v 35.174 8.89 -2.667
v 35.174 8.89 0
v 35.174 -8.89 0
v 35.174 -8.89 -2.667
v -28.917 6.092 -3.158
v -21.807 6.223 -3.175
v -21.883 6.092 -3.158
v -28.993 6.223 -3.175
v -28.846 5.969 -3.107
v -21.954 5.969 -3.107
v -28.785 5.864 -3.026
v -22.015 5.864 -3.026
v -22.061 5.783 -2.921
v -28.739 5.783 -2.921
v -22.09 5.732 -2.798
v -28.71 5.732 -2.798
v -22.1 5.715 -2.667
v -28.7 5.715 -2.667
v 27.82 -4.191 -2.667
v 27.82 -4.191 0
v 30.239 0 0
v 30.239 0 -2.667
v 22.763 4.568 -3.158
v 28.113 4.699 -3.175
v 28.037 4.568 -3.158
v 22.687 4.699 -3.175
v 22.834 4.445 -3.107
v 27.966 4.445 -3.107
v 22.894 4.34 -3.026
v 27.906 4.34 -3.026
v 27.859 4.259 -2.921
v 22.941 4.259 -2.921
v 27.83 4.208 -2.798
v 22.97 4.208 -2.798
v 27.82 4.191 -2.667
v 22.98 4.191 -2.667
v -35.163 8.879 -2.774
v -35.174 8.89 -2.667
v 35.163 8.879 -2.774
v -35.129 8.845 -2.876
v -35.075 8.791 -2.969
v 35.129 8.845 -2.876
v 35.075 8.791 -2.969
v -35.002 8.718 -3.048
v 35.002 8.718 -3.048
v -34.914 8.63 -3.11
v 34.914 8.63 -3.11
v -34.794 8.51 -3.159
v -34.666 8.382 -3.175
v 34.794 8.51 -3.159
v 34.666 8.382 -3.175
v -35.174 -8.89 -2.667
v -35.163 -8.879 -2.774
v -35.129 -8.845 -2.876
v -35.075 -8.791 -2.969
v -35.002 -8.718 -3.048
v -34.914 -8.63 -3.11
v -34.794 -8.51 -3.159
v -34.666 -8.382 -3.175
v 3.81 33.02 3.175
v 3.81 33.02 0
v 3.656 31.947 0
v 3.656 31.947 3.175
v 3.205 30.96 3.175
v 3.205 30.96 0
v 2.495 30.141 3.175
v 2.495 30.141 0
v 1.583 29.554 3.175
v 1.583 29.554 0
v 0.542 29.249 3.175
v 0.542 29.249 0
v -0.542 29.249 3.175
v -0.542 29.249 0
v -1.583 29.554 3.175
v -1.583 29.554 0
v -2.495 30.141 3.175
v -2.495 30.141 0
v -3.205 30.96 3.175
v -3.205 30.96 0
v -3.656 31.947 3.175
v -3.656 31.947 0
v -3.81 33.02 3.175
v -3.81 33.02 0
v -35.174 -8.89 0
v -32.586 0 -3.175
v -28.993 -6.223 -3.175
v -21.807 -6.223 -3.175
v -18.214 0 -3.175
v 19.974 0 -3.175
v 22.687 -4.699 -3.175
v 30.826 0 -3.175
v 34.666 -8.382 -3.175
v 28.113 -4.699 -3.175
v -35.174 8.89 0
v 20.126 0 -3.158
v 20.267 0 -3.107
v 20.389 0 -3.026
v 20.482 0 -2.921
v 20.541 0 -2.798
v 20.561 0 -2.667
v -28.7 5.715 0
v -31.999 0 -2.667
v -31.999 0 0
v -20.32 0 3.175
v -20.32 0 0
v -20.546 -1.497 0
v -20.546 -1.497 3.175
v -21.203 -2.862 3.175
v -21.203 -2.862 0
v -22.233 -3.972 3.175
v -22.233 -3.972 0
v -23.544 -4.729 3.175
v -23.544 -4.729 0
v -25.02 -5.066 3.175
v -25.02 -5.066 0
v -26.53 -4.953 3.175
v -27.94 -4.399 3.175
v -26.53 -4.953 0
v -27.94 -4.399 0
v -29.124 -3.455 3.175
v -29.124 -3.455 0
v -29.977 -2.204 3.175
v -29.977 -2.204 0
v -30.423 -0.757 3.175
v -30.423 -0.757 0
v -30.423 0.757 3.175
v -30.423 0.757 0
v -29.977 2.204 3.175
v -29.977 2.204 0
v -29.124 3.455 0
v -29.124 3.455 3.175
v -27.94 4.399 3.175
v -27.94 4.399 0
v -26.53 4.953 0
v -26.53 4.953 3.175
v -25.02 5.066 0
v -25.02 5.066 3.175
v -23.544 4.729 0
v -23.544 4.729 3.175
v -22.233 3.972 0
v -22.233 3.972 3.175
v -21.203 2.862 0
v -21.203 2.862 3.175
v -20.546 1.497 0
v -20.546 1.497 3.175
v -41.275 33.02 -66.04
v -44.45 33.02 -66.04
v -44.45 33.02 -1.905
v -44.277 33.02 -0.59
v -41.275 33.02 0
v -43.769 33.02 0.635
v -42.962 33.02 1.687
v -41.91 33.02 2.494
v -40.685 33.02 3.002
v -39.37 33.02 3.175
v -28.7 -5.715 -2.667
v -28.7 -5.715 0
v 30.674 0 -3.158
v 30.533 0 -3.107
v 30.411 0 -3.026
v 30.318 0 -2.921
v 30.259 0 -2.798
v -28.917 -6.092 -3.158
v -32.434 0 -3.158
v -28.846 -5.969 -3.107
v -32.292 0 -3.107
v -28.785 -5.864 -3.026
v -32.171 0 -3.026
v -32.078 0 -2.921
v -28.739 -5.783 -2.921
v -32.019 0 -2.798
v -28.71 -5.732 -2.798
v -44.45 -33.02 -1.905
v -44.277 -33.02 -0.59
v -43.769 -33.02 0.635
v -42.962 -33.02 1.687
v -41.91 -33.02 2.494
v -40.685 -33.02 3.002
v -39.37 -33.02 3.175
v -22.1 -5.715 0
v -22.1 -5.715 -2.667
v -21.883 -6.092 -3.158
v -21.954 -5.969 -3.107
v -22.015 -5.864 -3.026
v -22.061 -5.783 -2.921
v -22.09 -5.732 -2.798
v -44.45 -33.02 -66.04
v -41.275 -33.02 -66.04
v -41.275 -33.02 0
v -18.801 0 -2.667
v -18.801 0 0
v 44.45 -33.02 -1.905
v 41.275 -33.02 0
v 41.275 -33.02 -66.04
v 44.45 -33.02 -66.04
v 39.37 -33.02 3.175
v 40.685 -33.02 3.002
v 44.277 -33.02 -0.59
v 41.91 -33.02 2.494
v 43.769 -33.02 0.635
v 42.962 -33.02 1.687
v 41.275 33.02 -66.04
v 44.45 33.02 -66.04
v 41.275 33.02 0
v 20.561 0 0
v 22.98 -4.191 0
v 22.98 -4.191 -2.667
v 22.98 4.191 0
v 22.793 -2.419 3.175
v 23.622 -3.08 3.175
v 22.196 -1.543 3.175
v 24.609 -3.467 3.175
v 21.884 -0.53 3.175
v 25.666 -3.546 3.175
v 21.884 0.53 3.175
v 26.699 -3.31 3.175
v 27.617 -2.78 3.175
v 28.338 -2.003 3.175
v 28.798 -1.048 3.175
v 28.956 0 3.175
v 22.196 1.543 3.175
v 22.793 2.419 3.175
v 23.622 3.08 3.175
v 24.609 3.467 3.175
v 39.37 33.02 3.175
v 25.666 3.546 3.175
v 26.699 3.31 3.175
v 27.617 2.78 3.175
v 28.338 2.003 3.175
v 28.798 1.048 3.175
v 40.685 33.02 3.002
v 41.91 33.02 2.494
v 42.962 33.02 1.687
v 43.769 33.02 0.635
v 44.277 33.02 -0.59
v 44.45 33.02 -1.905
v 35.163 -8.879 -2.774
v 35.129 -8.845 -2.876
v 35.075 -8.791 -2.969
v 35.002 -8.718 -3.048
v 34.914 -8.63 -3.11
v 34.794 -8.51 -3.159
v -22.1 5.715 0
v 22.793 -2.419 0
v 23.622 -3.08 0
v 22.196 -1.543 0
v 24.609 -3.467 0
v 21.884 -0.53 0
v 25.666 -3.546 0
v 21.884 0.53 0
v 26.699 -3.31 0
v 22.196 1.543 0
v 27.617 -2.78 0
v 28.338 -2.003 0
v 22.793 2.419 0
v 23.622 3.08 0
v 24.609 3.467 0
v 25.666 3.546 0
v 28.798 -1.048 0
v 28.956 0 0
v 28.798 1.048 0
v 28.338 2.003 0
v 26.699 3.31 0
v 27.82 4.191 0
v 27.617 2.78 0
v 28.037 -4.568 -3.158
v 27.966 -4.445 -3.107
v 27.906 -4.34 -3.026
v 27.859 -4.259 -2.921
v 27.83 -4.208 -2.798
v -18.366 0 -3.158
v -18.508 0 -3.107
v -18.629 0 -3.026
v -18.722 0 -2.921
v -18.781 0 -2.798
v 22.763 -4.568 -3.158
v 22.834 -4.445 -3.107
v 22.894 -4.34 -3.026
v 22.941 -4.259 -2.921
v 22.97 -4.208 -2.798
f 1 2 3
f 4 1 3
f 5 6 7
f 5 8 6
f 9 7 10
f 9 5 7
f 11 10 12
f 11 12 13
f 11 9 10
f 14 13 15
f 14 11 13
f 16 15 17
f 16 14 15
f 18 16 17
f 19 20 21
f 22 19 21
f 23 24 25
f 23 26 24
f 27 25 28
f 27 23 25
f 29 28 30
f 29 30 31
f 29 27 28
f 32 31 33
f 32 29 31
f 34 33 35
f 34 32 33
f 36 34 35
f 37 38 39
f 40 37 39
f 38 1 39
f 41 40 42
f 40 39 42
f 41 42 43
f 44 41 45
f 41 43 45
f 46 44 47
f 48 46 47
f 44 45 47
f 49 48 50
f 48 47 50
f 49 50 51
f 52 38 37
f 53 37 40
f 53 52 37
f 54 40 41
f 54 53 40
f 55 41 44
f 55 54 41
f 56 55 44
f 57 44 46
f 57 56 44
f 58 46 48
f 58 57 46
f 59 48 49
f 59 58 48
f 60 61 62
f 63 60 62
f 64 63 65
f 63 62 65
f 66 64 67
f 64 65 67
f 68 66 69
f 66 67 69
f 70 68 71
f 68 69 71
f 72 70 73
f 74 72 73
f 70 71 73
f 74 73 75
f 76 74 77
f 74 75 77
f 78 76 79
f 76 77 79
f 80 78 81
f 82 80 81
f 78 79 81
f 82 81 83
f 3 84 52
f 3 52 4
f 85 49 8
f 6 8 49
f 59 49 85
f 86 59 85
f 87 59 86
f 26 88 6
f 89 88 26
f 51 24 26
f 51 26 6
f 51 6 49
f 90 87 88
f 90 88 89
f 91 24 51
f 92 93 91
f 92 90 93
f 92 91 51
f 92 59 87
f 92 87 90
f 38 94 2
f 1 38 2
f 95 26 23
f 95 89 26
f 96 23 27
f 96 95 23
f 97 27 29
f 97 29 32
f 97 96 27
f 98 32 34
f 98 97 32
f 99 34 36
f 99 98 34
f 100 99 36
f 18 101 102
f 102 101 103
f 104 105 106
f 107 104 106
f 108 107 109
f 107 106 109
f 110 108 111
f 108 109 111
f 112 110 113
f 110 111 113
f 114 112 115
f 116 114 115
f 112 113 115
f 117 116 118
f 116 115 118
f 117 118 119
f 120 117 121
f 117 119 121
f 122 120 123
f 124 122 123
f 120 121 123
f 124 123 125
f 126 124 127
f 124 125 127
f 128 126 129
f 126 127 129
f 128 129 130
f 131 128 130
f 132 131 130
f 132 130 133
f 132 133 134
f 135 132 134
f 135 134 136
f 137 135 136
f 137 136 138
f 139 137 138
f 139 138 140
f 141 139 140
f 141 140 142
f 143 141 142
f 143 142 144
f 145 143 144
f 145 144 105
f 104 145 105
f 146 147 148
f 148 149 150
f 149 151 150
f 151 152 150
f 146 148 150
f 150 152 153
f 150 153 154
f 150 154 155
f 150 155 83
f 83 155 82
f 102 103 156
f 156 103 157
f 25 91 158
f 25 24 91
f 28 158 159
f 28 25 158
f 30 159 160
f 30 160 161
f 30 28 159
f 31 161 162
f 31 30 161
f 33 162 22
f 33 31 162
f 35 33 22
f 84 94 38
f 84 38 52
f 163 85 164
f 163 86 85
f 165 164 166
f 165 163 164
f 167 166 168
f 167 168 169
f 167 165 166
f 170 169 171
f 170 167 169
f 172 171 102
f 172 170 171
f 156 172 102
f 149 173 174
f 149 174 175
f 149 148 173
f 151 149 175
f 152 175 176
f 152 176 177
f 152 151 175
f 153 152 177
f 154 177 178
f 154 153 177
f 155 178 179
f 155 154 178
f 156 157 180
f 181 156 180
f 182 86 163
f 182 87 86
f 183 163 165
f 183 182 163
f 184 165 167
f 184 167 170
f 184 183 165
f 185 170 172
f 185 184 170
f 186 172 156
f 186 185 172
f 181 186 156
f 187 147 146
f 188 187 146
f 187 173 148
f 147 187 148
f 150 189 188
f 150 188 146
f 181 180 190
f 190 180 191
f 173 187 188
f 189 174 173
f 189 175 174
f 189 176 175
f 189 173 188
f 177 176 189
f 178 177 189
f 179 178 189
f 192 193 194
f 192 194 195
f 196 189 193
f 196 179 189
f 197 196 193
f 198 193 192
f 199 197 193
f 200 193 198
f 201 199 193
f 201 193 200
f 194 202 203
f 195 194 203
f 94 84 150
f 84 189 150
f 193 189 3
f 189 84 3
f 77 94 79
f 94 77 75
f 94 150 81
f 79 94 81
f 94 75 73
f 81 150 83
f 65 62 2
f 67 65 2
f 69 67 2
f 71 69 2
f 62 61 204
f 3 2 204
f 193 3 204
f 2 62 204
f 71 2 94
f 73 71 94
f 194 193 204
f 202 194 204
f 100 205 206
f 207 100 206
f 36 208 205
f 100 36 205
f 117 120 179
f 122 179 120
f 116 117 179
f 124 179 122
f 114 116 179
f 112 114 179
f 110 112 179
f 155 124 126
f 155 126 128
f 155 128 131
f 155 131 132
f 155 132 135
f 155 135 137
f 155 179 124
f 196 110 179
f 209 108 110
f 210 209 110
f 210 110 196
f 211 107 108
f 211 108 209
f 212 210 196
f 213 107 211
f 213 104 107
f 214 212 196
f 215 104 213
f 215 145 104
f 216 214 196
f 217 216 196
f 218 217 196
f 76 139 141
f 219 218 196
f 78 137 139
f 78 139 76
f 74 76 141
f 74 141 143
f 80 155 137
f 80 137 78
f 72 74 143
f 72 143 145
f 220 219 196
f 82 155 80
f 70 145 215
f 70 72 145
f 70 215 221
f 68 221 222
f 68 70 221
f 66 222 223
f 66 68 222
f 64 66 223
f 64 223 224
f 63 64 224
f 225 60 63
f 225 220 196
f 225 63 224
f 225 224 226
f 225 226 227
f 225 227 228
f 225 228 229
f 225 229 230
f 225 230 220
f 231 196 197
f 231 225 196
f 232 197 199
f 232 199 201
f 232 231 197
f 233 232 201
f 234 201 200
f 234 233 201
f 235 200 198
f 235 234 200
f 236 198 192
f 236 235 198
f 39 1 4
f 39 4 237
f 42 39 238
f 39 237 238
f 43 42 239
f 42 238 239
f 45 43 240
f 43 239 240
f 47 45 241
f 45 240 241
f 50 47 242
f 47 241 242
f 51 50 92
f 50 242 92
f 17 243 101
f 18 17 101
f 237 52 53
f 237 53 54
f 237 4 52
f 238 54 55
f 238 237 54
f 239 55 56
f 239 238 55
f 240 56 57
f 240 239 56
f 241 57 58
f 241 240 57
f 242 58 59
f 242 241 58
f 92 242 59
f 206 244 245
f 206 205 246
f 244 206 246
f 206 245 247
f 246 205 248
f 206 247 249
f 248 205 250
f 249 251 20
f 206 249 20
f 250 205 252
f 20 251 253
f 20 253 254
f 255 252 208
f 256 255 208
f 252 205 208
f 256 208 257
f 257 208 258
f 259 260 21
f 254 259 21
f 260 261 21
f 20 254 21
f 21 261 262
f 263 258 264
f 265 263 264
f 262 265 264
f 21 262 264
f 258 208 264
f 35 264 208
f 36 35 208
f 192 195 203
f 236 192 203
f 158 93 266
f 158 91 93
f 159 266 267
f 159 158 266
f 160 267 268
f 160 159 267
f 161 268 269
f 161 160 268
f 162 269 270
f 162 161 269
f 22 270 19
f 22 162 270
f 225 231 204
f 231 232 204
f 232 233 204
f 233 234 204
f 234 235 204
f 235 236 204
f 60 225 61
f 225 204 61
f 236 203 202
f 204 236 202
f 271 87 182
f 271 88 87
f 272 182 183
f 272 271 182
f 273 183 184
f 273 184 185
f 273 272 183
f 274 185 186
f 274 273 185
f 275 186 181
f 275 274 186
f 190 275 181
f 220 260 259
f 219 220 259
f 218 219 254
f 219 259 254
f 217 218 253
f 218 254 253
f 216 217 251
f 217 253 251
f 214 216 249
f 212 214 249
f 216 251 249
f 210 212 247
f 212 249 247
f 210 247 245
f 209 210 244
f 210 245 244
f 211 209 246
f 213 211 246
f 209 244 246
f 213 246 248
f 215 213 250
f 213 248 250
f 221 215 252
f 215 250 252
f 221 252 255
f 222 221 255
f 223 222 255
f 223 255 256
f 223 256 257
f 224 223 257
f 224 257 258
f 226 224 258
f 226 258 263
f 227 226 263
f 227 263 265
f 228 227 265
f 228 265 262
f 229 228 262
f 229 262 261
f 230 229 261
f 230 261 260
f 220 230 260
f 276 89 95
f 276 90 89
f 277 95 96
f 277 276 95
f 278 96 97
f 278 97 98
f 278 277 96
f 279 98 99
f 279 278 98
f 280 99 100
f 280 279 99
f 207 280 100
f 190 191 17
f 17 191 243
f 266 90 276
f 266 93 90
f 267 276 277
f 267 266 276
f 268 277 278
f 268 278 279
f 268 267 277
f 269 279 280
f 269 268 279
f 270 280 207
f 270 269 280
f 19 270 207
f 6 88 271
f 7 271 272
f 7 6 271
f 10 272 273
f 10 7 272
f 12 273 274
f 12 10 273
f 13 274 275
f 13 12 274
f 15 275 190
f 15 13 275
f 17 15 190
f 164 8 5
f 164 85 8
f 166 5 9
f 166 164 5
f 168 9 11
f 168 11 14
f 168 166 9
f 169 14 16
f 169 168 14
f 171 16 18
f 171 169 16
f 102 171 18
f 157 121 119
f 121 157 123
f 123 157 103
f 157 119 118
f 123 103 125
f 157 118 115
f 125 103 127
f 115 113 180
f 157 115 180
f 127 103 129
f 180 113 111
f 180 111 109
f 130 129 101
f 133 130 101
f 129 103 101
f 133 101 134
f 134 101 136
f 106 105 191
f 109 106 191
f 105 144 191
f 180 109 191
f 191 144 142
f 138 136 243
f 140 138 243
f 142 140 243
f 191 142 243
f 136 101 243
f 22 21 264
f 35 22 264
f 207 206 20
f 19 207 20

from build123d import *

# Parameters (mm, degrees)
F0_W     = 3.175
F0_H     = 66.04
F1_DEPTH = 3.175
F2_DEPTH = 66.04
F3_R     = 5.08
F4_W     = 70.348228
F4_H     = 17.78
F5_DEPTH = 3.175
F4_R     = 5.08
F4_R_2   = 3.556
F6_DEPTH = 25.4
F7_R     = 0.508


with BuildPart() as f1:
    # F0 (on Top) → F1 (new body)
    with BuildSketch(Plane.XY):
        with Locations((42.8625, 0)):
            Rectangle(F0_W, F0_H)
        with Locations((-42.8625, 0)):
            Rectangle(F0_W, F0_H)
        with BuildLine():
            Line((41.275, -33.02), (41.275, 33.02))
            Line((41.275, 33.02), (3.81, 33.02))
            ThreePointArc((3.81, 33.02), (0, 29.21), (-3.81, 33.02))
            Line((-3.81, 33.02), (-41.275, 33.02))
            Line((-41.275, 33.02), (-41.275, -33.02))
            Line((-41.275, -33.02), (41.275, -33.02))
        make_face()
    extrude(amount=F1_DEPTH)

    # F0 (on Top) → F2 (join)
    with BuildSketch(Plane.XY):
        with Locations((-42.8625, 0)):
            Rectangle(F0_W, F0_H)
        with Locations((42.8625, 0)):
            Rectangle(F0_W, F0_H)
    extrude(amount=-F2_DEPTH)

    # F3
    f3_edges = [f1.edges().sort_by_distance(p)[0] for p in [
        (-44.45, 0, 3.175),
        (44.45, 0, 3.175),
    ]]
    fillet(f3_edges, radius=F3_R)

    # F4 (on face) → F5 (join)
    with BuildSketch(Plane(origin=(0, 0, 0), x_dir=(1, 0, 0), z_dir=(0, 0, -1))):
        Rectangle(F4_W, F4_H)
        Polygon((-18.800886, 0), (-22.100443, -5.715), (-28.699557, -5.715), (-31.999114, 0), (-28.699557, 5.715), (-22.100443, 5.715), align=None, mode=Mode.SUBTRACT)
        Polygon((30.23935, 0), (27.819675, -4.191), (22.980325, -4.191), (20.56065, 0), (22.980325, 4.191), (27.819675, 4.191), align=None, mode=Mode.SUBTRACT)
    extrude(amount=F5_DEPTH)

    # F4 (on face) → F6 (cut)
    with BuildSketch(Plane(origin=(0, 0, 0), x_dir=(1, 0, 0), z_dir=(0, 0, -1))):
        with Locations((-25.4, 0)):
            Circle(F4_R)
        with Locations((25.4, 0)):
            Circle(F4_R_2)
    extrude(amount=-F6_DEPTH, mode=Mode.SUBTRACT)

    # F7
    f7_edges = [f1.edges().sort_by_distance(p)[0] for p in [
        (35.174114, 0, -3.175),
        (0, -8.89, -3.175),
        (-35.174114, 0, -3.175),
        (0, 8.89, -3.175),
        (-20.450665, 2.8575, -3.175),
        (-25.4, 5.715, -3.175),
        (-30.349335, 2.8575, -3.175),
        (-30.349335, -2.8575, -3.175),
        (-25.4, -5.715, -3.175),
        (-20.450665, -2.8575, -3.175),
        (29.029512, -2.0955, -3.175),
        (29.029512, 2.0955, -3.175),
        (25.4, 4.191, -3.175),
        (21.770488, 2.0955, -3.175),
        (21.770488, -2.0955, -3.175),
        (25.4, -4.191, -3.175),
    ]]
    fillet(f7_edges, radius=F7_R)


solid = f1.part
